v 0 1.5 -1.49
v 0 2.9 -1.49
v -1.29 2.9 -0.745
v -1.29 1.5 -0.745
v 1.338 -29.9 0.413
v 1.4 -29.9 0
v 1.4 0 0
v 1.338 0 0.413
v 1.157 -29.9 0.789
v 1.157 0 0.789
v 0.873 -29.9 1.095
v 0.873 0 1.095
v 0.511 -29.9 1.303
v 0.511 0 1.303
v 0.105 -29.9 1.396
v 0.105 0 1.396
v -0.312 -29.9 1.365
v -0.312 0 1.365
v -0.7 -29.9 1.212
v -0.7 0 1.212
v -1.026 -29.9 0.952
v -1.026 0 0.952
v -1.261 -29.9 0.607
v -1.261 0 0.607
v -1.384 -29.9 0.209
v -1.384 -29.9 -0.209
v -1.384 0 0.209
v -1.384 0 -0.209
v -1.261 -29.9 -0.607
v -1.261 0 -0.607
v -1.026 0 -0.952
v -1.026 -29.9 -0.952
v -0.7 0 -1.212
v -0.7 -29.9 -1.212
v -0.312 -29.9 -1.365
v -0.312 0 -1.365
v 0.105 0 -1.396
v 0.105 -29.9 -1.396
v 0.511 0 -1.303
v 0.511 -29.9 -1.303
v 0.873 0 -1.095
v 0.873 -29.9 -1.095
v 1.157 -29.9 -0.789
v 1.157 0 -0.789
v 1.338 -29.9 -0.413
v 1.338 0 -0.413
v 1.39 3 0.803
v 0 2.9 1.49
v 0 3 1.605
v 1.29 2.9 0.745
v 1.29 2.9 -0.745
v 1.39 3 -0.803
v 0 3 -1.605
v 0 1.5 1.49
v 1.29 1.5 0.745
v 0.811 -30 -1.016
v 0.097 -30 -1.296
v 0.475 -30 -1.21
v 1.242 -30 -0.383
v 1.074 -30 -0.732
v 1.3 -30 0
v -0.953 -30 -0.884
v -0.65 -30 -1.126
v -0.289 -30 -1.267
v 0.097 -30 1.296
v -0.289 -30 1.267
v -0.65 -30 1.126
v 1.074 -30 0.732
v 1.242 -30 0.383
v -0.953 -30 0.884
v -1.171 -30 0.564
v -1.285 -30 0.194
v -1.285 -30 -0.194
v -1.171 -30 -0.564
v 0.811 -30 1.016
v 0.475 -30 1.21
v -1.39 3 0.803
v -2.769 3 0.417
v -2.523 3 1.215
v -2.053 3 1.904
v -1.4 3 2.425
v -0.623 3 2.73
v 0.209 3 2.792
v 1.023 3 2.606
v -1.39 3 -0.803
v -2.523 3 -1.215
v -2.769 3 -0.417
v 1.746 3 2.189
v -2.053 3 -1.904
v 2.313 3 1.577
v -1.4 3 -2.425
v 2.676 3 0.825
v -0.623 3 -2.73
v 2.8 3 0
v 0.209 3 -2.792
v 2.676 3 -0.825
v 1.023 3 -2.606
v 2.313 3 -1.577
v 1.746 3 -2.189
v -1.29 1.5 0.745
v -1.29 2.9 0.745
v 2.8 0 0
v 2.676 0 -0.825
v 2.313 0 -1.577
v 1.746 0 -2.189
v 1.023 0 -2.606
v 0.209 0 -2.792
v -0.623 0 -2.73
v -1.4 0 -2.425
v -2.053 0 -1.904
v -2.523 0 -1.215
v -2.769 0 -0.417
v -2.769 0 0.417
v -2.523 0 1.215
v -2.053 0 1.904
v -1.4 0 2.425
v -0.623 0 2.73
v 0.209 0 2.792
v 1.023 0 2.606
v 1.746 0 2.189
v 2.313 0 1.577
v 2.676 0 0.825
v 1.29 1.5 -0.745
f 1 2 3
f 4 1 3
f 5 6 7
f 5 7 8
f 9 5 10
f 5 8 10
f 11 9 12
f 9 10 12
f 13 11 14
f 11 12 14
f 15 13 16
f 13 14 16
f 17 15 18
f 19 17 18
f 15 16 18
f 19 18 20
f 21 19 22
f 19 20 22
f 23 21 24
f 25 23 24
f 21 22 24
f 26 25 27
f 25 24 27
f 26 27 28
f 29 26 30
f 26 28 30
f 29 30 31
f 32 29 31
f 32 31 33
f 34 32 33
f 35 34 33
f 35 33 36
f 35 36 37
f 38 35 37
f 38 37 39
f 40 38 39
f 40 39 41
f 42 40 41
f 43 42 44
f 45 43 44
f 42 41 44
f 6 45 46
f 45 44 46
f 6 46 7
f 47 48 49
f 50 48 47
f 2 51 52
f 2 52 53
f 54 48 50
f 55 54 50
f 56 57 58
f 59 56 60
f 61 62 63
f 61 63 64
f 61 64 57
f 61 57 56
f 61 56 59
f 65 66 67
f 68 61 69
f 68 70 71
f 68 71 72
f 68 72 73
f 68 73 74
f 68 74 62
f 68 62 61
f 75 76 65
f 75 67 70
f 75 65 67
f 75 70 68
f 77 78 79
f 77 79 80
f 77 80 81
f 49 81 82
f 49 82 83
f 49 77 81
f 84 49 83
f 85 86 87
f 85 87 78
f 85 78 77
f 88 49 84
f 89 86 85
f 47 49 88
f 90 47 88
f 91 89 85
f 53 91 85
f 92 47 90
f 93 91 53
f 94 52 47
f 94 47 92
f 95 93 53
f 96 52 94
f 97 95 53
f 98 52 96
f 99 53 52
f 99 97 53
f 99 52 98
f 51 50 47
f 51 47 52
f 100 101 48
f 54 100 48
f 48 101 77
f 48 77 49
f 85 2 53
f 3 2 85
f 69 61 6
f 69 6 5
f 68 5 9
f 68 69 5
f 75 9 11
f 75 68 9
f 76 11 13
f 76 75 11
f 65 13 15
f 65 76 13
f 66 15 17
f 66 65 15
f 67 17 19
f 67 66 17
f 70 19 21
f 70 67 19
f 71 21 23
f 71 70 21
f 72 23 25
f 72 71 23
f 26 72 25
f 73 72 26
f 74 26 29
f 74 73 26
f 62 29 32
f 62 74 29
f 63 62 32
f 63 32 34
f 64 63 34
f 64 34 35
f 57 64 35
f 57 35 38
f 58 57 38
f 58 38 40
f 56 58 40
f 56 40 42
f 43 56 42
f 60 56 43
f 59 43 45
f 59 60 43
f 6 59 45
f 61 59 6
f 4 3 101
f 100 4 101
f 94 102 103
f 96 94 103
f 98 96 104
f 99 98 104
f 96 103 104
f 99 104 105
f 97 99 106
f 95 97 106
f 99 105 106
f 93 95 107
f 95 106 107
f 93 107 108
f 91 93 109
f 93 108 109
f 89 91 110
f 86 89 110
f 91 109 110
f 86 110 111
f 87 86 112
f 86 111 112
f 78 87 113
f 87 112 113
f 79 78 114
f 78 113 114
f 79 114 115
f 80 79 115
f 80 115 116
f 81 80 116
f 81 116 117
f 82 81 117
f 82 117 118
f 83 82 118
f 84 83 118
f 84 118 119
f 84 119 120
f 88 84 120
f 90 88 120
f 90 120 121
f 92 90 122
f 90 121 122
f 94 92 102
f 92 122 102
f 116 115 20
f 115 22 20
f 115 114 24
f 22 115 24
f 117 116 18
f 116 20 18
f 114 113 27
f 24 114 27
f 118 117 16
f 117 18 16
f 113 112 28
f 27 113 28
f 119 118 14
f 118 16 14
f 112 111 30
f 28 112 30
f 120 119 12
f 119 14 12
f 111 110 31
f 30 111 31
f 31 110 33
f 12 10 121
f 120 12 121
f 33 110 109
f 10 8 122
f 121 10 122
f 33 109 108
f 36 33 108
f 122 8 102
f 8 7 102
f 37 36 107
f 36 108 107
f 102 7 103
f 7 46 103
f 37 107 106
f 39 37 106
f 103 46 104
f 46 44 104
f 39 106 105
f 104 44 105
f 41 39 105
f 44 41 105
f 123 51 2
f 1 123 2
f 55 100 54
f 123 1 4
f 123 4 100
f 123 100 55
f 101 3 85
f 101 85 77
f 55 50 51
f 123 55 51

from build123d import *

# Parameters (mm, degrees)
SKETCH_1_R          = 2.8
EXTRUDE_1_DEPTH     = 3
CUT_EXTRUDE_1_DEPTH = 1.5
SKETCH_3_R          = 1.4
EXTRUDE_2_DEPTH     = 30
CHAMFER_1_SIZE      = 0.1


with BuildPart() as part:
    # 草图1 → 凸台-拉伸1 (new body)
    with BuildSketch(Plane(origin=(0, 0, 0), x_dir=(1, 0, 0), z_dir=(0, 1, 0))):
        Circle(SKETCH_1_R)
    extrude(amount=EXTRUDE_1_DEPTH)

    # 草图2 → 切除-拉伸1 (cut)
    with BuildSketch(Plane(origin=(0, 3, 0), x_dir=(1, 0, 0), z_dir=(0, 1, 0))):
        Polygon((0, -1.489563695), (1.29, -0.744781847), (1.29, 0.744781847), (0, 1.489563695), (-1.29, 0.744781847), (-1.29, -0.744781847), align=None)
    extrude(amount=-CUT_EXTRUDE_1_DEPTH, mode=Mode.SUBTRACT)

    # 草图3 → 凸台-拉伸2 (add)
    with BuildSketch(Plane.XZ):
        Circle(SKETCH_3_R)
    extrude(amount=EXTRUDE_2_DEPTH)

    # 倒角1
    chamfer_1_edges = [part.edges().sort_by_distance(p)[0] for p in [
        (-0.645, 3, 1.117172771),
        (0.645, 3, 1.117172771),
        (1.29, 3, 0),
        (0.645, 3, -1.117172771),
        (-0.645, 3, -1.117172771),
        (-1.29, 3, 0),
        (-1.4, -30, 0),
    ]]
    chamfer(chamfer_1_edges, length=CHAMFER_1_SIZE)


solid = part.part
